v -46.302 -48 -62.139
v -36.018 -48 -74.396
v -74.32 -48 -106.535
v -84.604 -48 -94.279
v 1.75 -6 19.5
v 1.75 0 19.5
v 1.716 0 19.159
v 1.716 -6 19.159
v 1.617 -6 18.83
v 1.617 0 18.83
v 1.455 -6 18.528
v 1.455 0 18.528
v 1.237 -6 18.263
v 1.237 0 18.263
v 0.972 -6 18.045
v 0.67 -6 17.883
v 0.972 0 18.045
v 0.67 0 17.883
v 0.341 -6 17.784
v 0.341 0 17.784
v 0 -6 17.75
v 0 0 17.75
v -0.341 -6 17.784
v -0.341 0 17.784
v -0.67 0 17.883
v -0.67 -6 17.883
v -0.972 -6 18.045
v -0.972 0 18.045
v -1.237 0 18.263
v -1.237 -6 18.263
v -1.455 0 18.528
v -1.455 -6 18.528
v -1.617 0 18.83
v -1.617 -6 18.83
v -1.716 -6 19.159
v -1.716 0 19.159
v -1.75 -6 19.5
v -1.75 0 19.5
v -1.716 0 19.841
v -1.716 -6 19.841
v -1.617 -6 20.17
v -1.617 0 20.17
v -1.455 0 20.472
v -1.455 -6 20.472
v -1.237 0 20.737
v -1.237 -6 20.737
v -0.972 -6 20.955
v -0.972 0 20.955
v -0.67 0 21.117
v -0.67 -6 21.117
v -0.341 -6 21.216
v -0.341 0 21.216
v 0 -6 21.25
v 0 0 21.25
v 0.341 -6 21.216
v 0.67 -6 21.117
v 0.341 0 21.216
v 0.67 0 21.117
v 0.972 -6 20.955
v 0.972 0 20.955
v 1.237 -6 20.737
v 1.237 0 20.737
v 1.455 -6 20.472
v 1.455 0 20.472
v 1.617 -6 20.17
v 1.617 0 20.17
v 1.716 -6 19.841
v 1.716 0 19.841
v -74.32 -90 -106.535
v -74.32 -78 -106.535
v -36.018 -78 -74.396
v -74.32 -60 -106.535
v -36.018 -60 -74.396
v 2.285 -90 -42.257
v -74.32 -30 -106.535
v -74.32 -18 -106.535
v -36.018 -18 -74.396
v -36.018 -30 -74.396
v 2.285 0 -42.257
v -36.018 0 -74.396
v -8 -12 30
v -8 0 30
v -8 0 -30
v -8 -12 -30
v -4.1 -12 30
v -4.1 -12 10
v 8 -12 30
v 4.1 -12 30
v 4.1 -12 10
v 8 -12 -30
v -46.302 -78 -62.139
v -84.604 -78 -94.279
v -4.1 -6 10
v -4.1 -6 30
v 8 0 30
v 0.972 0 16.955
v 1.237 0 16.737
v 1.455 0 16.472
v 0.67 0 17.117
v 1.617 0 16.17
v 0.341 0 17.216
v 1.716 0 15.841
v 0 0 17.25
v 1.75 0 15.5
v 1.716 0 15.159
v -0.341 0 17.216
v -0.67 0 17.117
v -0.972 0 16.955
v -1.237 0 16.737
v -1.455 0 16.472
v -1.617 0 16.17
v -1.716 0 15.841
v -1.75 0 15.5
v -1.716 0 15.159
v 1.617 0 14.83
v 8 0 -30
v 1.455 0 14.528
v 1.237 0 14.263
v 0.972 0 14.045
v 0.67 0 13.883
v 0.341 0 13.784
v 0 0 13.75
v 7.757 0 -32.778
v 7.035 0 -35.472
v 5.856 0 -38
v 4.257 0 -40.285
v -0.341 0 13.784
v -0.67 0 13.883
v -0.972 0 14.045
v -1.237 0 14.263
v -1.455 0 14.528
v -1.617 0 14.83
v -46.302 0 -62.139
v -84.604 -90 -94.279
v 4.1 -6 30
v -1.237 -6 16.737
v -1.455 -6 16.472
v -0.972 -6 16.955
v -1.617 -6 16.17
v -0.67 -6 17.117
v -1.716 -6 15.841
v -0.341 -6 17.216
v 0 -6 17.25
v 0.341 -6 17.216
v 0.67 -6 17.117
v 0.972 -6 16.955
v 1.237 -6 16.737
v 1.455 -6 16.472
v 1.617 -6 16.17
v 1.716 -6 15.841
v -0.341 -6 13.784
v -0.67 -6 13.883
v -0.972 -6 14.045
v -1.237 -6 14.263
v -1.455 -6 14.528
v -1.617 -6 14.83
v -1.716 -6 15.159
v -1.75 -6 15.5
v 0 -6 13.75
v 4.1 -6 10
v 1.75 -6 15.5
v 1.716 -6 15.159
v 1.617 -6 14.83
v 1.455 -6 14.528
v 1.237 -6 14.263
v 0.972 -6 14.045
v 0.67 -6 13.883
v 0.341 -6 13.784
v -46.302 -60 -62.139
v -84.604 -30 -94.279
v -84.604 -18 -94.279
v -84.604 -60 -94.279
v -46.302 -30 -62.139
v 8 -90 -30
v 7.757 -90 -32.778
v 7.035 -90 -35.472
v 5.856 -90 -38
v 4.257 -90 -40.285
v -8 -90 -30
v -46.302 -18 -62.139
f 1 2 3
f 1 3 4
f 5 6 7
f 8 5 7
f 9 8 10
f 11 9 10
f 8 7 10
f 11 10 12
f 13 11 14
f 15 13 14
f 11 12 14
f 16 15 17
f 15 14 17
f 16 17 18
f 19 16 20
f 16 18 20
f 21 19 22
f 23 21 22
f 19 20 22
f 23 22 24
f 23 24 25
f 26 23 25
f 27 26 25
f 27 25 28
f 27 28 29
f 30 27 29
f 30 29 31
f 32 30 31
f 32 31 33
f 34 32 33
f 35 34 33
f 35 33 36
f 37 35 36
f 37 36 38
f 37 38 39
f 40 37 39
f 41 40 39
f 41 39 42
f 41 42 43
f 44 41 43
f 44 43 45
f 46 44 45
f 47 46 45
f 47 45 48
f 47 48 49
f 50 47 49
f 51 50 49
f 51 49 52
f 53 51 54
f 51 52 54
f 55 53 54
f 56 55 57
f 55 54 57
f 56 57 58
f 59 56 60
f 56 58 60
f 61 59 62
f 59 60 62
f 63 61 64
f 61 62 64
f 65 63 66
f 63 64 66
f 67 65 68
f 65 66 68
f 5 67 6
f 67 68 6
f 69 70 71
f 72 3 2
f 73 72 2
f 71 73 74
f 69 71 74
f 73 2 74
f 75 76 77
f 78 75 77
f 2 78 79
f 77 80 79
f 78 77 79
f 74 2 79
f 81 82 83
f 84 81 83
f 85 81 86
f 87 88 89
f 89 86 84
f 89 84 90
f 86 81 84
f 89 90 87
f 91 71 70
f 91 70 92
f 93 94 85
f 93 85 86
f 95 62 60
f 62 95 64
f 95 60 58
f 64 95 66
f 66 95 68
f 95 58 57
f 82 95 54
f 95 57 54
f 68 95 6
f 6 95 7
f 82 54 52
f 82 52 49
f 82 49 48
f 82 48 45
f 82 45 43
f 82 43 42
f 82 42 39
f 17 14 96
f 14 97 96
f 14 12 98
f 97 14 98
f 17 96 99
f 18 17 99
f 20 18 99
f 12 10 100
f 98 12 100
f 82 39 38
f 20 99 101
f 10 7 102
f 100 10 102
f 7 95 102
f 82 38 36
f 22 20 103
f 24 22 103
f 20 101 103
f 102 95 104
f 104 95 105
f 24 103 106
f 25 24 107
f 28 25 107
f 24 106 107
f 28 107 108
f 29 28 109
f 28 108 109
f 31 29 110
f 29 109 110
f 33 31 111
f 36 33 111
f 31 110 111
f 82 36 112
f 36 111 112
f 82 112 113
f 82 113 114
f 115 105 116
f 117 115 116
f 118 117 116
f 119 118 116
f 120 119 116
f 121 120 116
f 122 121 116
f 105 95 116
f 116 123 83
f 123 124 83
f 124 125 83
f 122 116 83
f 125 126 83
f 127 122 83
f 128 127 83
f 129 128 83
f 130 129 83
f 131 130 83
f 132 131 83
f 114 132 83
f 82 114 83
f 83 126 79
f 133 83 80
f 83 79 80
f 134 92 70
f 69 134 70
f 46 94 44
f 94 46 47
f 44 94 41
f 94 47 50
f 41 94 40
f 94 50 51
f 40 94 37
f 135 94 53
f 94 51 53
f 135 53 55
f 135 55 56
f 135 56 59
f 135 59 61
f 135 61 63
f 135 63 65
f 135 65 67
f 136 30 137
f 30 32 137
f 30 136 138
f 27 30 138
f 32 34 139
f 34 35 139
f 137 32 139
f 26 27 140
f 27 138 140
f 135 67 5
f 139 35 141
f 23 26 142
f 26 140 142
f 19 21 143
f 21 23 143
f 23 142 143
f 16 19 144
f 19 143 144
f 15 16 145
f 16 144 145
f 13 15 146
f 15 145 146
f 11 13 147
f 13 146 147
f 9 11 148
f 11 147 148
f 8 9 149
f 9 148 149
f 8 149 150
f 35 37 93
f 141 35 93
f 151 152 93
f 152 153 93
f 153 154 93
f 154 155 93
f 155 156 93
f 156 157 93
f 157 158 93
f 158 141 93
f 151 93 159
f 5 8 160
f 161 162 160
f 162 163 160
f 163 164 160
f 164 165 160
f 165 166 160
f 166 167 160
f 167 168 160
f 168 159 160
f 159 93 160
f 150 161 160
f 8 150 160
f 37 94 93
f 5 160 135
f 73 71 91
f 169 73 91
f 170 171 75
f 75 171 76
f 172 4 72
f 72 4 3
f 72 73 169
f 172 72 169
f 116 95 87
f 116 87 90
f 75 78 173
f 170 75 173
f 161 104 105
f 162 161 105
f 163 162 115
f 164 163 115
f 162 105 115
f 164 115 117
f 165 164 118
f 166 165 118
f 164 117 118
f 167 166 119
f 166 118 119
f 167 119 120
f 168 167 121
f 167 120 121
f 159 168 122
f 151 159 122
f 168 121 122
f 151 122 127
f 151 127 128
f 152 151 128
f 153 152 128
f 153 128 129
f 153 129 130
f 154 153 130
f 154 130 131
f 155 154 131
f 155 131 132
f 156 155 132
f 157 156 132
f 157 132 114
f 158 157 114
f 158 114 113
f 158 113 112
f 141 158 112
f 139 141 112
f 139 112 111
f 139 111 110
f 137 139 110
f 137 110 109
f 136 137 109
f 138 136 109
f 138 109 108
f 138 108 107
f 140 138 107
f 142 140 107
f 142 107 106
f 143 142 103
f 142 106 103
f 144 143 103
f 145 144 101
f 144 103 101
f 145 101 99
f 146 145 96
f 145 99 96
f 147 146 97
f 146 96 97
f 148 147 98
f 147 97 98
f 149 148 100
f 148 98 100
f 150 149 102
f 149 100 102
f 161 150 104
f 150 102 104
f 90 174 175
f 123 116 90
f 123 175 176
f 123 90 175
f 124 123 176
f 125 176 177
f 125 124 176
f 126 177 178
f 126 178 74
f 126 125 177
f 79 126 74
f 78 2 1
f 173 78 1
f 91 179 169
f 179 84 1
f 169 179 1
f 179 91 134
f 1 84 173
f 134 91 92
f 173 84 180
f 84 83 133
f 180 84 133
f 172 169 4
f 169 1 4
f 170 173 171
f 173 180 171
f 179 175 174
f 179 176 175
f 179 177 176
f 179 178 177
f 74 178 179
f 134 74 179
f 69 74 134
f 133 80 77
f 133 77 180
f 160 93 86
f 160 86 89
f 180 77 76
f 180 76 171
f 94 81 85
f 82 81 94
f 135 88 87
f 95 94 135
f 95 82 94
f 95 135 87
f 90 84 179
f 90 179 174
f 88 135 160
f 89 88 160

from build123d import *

# Parameters (mm, degrees)
SKETCH_1_W          = 16
SKETCH_1_H          = 60
EXTRUDE_1_DEPTH     = 12
EXTRUDE_2_DEPTH     = 90
SKETCH_3_W          = 16
SKETCH_3_H          = 18
CUT_EXTRUDE_2_DEPTH = 50
CUT_EXTRUDE_START   = -6
CUT_EXTRUDE_3_DEPTH = 6
SKETCH_2_4_R        = 1.75
CUT_EXTRUDE_4_DEPTH = 12


with BuildPart() as part:
    # 草图1 → 凸台-拉伸1 (new body)
    with BuildSketch(Plane(origin=(0, 0, 0), x_dir=(1, 0, 0), z_dir=(0, 1, 0))):
        Rectangle(SKETCH_1_W, SKETCH_1_H)
    extrude(amount=-EXTRUDE_1_DEPTH)

    # 草图1<4> → 凸台-拉伸2 (add)
    with BuildSketch(Plane(origin=(0, 0, 0), x_dir=(1, 0, 0), z_dir=(0, 1, 0))):
        with BuildLine():
            Line((-84.604444312, 94.278760969), (-8, 30))
            Line((-8, 30), (8, 30))
            ThreePointArc((8, 30), (6.500924593, 36.761892188), (2.284601755, 42.25671109))
            Line((2.284601755, 42.25671109), (-74.319842557, 106.535472059))
            Line((-74.319842557, 106.535472059), (-84.604444312, 94.278760969))
        make_face()
    extrude(amount=-EXTRUDE_2_DEPTH)

    # 草图3 → 切除-拉伸2 (cut)
    with BuildSketch(Plane(origin=(-96.071153318, 0, -80.613269316), x_dir=(-0.6427876096865492, 0, 0.7660444431189698), z_dir=(-0.7660444431189698, 0, -0.6427876096865492))):
        with Locations((-25.839032416, -9)):
            Rectangle(SKETCH_3_W, SKETCH_3_H)
        with Locations((-25.839032416, -39)):
            Rectangle(SKETCH_3_W, SKETCH_3_H)
        with Locations((-25.839032416, -69)):
            Rectangle(SKETCH_3_W, SKETCH_3_H)
    extrude(amount=-CUT_EXTRUDE_2_DEPTH, mode=Mode.SUBTRACT)

    # 草图2 → 切除-拉伸3 (cut)
    with BuildSketch(Plane(origin=(0, 0, 0), x_dir=(1, 0, 0), z_dir=(0, 1, 0)).offset(CUT_EXTRUDE_START)):
        Polygon((-4.1, -30), (0, -30), (4.1, -30), (4.1, -10), (-4.1, -10), align=None)
        with BuildLine():
            ThreePointArc((1.75, -19.5), (1.237436867, -20.737436867), (0, -21.25))
            ThreePointArc((0, -21.25), (-1.75, -19.5), (0, -17.75))
            ThreePointArc((0, -17.75), (1.237436867, -18.262563133), (1.75, -19.5))
        make_face(mode=Mode.SUBTRACT)
        with BuildLine():
            ThreePointArc((1.75, -15.5), (1.237436867, -16.737436867), (0, -17.25))
            ThreePointArc((0, -17.25), (-1.237436867, -14.262563133), (1.75, -15.5))
        make_face(mode=Mode.SUBTRACT)
    extrude(amount=-CUT_EXTRUDE_3_DEPTH, mode=Mode.SUBTRACT)

    # 草图2<4> → 切除-拉伸4 (cut)
    with BuildSketch(Plane(origin=(0, 0, 0), x_dir=(1, 0, 0), z_dir=(0, 1, 0))):
        with Locations((0, -15.5)):
            Circle(SKETCH_2_4_R)
        with Locations((0, -19.5)):
            Circle(SKETCH_2_4_R)
    extrude(amount=-CUT_EXTRUDE_4_DEPTH, mode=Mode.SUBTRACT)


solid = part.part
